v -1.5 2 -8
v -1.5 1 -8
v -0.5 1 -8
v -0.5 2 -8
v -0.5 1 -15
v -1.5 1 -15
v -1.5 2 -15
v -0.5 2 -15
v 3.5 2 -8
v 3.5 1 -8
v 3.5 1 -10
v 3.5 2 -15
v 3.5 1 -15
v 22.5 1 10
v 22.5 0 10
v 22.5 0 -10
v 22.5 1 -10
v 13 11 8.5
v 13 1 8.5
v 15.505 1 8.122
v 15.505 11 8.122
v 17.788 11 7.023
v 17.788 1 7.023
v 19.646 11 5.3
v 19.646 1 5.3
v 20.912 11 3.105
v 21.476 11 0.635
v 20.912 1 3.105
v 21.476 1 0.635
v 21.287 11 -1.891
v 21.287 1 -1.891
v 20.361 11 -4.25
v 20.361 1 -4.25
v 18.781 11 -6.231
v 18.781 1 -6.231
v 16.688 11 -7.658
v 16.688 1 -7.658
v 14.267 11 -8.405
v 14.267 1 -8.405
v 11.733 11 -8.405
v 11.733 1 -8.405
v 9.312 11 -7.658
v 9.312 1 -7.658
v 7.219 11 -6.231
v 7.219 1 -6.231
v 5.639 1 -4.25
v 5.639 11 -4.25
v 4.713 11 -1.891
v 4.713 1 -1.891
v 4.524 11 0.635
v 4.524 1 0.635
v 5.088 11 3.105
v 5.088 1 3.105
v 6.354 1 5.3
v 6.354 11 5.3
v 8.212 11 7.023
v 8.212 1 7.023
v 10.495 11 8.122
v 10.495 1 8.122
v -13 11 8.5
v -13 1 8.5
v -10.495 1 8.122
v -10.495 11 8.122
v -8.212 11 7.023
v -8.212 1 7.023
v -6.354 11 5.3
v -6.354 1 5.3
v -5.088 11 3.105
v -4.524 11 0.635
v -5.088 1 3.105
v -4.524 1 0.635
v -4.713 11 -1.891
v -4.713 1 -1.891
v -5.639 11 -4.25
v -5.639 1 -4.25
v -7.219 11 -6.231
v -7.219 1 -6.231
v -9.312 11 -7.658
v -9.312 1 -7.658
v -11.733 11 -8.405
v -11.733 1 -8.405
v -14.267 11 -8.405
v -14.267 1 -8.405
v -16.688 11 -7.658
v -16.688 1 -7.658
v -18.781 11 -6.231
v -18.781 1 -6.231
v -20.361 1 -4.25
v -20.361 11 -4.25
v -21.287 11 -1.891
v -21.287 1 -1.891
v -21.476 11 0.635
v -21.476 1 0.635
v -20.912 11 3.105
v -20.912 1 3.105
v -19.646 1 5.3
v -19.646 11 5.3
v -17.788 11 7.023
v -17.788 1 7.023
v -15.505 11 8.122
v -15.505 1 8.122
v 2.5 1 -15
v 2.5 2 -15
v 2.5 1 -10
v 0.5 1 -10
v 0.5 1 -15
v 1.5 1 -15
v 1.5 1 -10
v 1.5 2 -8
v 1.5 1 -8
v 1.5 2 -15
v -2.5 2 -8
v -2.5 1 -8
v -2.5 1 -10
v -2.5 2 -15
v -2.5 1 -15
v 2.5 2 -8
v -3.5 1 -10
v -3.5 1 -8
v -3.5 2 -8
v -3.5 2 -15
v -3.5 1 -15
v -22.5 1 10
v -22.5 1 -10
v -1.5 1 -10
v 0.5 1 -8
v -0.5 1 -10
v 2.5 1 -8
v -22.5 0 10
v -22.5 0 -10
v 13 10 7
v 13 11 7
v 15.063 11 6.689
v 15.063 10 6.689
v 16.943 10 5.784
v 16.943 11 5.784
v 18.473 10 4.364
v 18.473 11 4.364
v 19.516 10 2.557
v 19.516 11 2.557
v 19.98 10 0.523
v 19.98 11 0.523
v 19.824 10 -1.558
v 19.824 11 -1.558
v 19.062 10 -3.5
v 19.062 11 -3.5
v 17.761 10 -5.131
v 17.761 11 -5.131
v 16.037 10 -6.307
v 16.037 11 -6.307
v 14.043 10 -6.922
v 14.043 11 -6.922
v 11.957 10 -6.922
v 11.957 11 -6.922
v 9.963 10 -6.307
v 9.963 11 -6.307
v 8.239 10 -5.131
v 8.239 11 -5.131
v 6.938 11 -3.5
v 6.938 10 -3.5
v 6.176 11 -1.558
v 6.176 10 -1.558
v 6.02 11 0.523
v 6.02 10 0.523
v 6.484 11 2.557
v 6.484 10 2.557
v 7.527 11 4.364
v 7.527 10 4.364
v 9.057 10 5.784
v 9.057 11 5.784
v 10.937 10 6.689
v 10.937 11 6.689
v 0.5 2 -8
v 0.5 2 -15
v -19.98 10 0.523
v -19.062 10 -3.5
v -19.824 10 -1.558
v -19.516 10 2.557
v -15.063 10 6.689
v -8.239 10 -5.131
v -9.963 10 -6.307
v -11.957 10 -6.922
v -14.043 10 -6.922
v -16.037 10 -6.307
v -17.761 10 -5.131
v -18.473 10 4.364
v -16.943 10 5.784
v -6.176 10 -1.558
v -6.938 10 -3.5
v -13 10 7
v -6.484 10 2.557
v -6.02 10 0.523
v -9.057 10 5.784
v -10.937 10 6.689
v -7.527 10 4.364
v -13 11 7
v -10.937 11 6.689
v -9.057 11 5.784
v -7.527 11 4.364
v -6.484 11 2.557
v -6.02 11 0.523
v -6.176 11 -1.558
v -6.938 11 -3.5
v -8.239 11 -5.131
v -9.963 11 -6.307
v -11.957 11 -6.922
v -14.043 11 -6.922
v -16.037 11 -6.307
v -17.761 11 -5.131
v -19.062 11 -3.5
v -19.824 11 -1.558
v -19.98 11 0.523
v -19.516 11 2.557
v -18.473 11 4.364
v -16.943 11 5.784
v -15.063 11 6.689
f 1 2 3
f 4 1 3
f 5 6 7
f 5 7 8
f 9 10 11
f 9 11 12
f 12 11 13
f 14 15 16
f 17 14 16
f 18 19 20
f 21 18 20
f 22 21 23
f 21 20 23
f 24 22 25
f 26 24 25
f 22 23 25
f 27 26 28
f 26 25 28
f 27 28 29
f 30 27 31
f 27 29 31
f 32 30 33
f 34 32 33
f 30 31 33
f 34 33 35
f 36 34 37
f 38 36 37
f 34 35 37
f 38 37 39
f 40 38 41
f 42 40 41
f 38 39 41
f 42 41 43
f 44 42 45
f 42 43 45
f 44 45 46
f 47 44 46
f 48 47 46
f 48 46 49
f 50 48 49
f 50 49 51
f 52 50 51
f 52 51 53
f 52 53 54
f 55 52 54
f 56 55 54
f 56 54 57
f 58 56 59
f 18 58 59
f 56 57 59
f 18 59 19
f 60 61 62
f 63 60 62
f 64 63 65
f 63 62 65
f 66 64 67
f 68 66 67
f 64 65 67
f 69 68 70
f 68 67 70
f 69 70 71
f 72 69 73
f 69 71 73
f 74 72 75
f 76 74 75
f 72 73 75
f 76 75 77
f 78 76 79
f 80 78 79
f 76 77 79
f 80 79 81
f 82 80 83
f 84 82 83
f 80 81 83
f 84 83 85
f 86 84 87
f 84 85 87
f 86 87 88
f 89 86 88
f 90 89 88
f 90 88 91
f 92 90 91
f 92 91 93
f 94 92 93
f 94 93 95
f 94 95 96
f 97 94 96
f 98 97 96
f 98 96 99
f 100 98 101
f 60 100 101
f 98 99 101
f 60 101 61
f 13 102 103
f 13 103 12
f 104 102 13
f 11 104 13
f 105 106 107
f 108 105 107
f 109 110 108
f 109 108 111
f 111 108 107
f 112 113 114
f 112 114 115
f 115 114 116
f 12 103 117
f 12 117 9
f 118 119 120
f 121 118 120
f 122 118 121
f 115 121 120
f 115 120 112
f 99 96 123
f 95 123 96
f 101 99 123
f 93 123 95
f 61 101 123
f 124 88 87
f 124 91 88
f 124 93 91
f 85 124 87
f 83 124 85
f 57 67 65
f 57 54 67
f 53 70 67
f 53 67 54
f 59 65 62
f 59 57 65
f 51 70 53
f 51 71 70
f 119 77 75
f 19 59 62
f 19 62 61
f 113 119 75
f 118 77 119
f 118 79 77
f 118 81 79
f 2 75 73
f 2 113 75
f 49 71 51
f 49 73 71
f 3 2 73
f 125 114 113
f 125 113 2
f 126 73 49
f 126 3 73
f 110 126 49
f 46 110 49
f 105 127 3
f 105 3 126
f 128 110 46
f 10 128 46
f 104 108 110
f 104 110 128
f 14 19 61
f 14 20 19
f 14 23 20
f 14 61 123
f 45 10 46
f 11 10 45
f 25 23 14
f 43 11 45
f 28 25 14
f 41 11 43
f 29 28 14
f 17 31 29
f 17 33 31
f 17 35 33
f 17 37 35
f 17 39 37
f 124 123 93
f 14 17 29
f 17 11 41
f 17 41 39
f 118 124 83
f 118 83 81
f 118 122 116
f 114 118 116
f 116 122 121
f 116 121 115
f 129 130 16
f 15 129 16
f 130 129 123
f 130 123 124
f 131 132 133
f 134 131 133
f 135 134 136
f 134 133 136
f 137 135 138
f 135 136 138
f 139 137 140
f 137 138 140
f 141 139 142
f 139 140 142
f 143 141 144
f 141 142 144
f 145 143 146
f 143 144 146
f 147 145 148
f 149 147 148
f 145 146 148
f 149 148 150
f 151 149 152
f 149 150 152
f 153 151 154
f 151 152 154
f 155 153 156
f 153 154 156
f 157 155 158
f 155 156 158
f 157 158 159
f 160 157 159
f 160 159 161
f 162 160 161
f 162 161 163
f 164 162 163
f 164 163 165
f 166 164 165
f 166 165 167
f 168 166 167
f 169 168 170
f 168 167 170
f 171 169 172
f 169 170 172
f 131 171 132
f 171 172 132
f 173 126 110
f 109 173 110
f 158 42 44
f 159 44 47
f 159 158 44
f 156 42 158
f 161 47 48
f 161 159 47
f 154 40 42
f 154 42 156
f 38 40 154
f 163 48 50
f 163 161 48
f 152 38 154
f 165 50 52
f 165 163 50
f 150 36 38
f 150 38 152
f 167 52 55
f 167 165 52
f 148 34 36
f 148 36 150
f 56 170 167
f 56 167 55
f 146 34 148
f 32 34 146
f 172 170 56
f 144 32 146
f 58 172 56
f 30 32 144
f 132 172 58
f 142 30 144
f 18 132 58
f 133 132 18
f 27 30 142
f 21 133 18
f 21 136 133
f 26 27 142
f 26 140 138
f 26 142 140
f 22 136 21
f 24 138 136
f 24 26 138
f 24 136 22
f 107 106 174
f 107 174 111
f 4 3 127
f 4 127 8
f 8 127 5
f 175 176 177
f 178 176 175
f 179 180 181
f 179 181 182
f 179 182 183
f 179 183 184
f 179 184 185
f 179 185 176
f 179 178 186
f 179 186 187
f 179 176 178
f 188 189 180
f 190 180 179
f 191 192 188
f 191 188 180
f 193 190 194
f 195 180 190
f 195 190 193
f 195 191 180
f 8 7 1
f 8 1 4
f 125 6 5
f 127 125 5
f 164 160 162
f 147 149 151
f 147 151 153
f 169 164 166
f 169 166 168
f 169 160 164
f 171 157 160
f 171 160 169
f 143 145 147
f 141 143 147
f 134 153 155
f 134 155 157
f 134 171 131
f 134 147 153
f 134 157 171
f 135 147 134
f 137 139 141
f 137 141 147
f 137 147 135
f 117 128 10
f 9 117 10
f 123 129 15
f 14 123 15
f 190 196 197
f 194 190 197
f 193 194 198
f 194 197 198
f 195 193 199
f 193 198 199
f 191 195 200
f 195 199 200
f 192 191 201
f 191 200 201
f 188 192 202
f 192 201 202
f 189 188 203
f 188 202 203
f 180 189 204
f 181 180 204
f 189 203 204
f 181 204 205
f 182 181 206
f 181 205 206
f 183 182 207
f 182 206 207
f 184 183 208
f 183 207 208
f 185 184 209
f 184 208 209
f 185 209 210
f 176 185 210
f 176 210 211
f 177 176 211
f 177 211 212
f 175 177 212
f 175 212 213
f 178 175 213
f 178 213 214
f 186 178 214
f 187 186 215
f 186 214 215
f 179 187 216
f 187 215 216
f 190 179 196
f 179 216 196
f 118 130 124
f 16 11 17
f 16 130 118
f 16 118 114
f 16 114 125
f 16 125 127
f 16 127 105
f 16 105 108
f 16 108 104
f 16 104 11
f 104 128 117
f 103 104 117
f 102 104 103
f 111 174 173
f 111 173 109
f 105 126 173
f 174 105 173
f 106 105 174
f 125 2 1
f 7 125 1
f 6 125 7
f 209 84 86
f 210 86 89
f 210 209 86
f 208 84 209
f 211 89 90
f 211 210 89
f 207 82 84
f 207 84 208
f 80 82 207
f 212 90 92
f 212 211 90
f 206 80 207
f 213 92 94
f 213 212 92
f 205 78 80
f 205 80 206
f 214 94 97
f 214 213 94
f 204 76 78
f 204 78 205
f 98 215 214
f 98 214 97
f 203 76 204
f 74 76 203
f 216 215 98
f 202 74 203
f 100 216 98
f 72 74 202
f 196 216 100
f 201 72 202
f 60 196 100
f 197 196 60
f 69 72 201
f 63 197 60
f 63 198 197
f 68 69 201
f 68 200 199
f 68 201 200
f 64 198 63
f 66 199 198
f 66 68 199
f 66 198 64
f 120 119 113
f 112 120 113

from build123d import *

# Parameters (mm, degrees)
SKETCH1_W           = 45
SKETCH1_H           = 20
BOSS_EXTRUDE1_DEPTH = 1
SKETCH2_R           = 8.5
BOSS_EXTRUDE2_DEPTH = 10
SKETCH3_R           = 7
CUT_EXTRUDE1_DEPTH  = 1
SKETCH4_W           = 1
SKETCH4_H           = 7
BOSS_EXTRUDE3_DEPTH = 1


with BuildPart() as part:
    # Sketch1 → Boss-Extrude1 (new body)
    with BuildSketch(Plane(origin=(0, 0, 0), x_dir=(1, 0, 0), z_dir=(0, 1, 0))):
        Rectangle(SKETCH1_W, SKETCH1_H)
    extrude(amount=BOSS_EXTRUDE1_DEPTH)

    # Sketch2 → Boss-Extrude2 (add)
    with BuildSketch(Plane(origin=(0, 1, 0), x_dir=(1, 0, 0), z_dir=(0, 1, 0))):
        with Locations(Location((-13, 0, 0), (0, 0, 270))):
            Circle(SKETCH2_R)
        with Locations(Location((13, 0, 0), (0, 0, 270))):
            Circle(SKETCH2_R)
    extrude(amount=BOSS_EXTRUDE2_DEPTH)

    # Sketch3 → Cut-Extrude1 (cut)
    with BuildSketch(Plane(origin=(0, 11, 0), x_dir=(1, 0, 0), z_dir=(0, 1, 0))):
        with Locations(Location((-13, 0, 0), (0, 0, 270))):
            Circle(SKETCH3_R)
        with Locations(Location((13, 0, 0), (0, 0, 270))):
            Circle(SKETCH3_R)
    extrude(amount=-CUT_EXTRUDE1_DEPTH, mode=Mode.SUBTRACT)

    # Sketch4 → Boss-Extrude3 (add)
    with BuildSketch(Plane(origin=(0, 1, 0), x_dir=(1, 0, 0), z_dir=(0, 1, 0))):
        with Locations((-1, 11.5)):
            Rectangle(SKETCH4_W, SKETCH4_H)
        with Locations((-3, 11.5)):
            Rectangle(SKETCH4_W, SKETCH4_H)
        with Locations((3, 11.5)):
            Rectangle(SKETCH4_W, SKETCH4_H)
        with Locations((1, 11.5)):
            Rectangle(SKETCH4_W, SKETCH4_H)
    extrude(amount=BOSS_EXTRUDE3_DEPTH)


solid = part.part
